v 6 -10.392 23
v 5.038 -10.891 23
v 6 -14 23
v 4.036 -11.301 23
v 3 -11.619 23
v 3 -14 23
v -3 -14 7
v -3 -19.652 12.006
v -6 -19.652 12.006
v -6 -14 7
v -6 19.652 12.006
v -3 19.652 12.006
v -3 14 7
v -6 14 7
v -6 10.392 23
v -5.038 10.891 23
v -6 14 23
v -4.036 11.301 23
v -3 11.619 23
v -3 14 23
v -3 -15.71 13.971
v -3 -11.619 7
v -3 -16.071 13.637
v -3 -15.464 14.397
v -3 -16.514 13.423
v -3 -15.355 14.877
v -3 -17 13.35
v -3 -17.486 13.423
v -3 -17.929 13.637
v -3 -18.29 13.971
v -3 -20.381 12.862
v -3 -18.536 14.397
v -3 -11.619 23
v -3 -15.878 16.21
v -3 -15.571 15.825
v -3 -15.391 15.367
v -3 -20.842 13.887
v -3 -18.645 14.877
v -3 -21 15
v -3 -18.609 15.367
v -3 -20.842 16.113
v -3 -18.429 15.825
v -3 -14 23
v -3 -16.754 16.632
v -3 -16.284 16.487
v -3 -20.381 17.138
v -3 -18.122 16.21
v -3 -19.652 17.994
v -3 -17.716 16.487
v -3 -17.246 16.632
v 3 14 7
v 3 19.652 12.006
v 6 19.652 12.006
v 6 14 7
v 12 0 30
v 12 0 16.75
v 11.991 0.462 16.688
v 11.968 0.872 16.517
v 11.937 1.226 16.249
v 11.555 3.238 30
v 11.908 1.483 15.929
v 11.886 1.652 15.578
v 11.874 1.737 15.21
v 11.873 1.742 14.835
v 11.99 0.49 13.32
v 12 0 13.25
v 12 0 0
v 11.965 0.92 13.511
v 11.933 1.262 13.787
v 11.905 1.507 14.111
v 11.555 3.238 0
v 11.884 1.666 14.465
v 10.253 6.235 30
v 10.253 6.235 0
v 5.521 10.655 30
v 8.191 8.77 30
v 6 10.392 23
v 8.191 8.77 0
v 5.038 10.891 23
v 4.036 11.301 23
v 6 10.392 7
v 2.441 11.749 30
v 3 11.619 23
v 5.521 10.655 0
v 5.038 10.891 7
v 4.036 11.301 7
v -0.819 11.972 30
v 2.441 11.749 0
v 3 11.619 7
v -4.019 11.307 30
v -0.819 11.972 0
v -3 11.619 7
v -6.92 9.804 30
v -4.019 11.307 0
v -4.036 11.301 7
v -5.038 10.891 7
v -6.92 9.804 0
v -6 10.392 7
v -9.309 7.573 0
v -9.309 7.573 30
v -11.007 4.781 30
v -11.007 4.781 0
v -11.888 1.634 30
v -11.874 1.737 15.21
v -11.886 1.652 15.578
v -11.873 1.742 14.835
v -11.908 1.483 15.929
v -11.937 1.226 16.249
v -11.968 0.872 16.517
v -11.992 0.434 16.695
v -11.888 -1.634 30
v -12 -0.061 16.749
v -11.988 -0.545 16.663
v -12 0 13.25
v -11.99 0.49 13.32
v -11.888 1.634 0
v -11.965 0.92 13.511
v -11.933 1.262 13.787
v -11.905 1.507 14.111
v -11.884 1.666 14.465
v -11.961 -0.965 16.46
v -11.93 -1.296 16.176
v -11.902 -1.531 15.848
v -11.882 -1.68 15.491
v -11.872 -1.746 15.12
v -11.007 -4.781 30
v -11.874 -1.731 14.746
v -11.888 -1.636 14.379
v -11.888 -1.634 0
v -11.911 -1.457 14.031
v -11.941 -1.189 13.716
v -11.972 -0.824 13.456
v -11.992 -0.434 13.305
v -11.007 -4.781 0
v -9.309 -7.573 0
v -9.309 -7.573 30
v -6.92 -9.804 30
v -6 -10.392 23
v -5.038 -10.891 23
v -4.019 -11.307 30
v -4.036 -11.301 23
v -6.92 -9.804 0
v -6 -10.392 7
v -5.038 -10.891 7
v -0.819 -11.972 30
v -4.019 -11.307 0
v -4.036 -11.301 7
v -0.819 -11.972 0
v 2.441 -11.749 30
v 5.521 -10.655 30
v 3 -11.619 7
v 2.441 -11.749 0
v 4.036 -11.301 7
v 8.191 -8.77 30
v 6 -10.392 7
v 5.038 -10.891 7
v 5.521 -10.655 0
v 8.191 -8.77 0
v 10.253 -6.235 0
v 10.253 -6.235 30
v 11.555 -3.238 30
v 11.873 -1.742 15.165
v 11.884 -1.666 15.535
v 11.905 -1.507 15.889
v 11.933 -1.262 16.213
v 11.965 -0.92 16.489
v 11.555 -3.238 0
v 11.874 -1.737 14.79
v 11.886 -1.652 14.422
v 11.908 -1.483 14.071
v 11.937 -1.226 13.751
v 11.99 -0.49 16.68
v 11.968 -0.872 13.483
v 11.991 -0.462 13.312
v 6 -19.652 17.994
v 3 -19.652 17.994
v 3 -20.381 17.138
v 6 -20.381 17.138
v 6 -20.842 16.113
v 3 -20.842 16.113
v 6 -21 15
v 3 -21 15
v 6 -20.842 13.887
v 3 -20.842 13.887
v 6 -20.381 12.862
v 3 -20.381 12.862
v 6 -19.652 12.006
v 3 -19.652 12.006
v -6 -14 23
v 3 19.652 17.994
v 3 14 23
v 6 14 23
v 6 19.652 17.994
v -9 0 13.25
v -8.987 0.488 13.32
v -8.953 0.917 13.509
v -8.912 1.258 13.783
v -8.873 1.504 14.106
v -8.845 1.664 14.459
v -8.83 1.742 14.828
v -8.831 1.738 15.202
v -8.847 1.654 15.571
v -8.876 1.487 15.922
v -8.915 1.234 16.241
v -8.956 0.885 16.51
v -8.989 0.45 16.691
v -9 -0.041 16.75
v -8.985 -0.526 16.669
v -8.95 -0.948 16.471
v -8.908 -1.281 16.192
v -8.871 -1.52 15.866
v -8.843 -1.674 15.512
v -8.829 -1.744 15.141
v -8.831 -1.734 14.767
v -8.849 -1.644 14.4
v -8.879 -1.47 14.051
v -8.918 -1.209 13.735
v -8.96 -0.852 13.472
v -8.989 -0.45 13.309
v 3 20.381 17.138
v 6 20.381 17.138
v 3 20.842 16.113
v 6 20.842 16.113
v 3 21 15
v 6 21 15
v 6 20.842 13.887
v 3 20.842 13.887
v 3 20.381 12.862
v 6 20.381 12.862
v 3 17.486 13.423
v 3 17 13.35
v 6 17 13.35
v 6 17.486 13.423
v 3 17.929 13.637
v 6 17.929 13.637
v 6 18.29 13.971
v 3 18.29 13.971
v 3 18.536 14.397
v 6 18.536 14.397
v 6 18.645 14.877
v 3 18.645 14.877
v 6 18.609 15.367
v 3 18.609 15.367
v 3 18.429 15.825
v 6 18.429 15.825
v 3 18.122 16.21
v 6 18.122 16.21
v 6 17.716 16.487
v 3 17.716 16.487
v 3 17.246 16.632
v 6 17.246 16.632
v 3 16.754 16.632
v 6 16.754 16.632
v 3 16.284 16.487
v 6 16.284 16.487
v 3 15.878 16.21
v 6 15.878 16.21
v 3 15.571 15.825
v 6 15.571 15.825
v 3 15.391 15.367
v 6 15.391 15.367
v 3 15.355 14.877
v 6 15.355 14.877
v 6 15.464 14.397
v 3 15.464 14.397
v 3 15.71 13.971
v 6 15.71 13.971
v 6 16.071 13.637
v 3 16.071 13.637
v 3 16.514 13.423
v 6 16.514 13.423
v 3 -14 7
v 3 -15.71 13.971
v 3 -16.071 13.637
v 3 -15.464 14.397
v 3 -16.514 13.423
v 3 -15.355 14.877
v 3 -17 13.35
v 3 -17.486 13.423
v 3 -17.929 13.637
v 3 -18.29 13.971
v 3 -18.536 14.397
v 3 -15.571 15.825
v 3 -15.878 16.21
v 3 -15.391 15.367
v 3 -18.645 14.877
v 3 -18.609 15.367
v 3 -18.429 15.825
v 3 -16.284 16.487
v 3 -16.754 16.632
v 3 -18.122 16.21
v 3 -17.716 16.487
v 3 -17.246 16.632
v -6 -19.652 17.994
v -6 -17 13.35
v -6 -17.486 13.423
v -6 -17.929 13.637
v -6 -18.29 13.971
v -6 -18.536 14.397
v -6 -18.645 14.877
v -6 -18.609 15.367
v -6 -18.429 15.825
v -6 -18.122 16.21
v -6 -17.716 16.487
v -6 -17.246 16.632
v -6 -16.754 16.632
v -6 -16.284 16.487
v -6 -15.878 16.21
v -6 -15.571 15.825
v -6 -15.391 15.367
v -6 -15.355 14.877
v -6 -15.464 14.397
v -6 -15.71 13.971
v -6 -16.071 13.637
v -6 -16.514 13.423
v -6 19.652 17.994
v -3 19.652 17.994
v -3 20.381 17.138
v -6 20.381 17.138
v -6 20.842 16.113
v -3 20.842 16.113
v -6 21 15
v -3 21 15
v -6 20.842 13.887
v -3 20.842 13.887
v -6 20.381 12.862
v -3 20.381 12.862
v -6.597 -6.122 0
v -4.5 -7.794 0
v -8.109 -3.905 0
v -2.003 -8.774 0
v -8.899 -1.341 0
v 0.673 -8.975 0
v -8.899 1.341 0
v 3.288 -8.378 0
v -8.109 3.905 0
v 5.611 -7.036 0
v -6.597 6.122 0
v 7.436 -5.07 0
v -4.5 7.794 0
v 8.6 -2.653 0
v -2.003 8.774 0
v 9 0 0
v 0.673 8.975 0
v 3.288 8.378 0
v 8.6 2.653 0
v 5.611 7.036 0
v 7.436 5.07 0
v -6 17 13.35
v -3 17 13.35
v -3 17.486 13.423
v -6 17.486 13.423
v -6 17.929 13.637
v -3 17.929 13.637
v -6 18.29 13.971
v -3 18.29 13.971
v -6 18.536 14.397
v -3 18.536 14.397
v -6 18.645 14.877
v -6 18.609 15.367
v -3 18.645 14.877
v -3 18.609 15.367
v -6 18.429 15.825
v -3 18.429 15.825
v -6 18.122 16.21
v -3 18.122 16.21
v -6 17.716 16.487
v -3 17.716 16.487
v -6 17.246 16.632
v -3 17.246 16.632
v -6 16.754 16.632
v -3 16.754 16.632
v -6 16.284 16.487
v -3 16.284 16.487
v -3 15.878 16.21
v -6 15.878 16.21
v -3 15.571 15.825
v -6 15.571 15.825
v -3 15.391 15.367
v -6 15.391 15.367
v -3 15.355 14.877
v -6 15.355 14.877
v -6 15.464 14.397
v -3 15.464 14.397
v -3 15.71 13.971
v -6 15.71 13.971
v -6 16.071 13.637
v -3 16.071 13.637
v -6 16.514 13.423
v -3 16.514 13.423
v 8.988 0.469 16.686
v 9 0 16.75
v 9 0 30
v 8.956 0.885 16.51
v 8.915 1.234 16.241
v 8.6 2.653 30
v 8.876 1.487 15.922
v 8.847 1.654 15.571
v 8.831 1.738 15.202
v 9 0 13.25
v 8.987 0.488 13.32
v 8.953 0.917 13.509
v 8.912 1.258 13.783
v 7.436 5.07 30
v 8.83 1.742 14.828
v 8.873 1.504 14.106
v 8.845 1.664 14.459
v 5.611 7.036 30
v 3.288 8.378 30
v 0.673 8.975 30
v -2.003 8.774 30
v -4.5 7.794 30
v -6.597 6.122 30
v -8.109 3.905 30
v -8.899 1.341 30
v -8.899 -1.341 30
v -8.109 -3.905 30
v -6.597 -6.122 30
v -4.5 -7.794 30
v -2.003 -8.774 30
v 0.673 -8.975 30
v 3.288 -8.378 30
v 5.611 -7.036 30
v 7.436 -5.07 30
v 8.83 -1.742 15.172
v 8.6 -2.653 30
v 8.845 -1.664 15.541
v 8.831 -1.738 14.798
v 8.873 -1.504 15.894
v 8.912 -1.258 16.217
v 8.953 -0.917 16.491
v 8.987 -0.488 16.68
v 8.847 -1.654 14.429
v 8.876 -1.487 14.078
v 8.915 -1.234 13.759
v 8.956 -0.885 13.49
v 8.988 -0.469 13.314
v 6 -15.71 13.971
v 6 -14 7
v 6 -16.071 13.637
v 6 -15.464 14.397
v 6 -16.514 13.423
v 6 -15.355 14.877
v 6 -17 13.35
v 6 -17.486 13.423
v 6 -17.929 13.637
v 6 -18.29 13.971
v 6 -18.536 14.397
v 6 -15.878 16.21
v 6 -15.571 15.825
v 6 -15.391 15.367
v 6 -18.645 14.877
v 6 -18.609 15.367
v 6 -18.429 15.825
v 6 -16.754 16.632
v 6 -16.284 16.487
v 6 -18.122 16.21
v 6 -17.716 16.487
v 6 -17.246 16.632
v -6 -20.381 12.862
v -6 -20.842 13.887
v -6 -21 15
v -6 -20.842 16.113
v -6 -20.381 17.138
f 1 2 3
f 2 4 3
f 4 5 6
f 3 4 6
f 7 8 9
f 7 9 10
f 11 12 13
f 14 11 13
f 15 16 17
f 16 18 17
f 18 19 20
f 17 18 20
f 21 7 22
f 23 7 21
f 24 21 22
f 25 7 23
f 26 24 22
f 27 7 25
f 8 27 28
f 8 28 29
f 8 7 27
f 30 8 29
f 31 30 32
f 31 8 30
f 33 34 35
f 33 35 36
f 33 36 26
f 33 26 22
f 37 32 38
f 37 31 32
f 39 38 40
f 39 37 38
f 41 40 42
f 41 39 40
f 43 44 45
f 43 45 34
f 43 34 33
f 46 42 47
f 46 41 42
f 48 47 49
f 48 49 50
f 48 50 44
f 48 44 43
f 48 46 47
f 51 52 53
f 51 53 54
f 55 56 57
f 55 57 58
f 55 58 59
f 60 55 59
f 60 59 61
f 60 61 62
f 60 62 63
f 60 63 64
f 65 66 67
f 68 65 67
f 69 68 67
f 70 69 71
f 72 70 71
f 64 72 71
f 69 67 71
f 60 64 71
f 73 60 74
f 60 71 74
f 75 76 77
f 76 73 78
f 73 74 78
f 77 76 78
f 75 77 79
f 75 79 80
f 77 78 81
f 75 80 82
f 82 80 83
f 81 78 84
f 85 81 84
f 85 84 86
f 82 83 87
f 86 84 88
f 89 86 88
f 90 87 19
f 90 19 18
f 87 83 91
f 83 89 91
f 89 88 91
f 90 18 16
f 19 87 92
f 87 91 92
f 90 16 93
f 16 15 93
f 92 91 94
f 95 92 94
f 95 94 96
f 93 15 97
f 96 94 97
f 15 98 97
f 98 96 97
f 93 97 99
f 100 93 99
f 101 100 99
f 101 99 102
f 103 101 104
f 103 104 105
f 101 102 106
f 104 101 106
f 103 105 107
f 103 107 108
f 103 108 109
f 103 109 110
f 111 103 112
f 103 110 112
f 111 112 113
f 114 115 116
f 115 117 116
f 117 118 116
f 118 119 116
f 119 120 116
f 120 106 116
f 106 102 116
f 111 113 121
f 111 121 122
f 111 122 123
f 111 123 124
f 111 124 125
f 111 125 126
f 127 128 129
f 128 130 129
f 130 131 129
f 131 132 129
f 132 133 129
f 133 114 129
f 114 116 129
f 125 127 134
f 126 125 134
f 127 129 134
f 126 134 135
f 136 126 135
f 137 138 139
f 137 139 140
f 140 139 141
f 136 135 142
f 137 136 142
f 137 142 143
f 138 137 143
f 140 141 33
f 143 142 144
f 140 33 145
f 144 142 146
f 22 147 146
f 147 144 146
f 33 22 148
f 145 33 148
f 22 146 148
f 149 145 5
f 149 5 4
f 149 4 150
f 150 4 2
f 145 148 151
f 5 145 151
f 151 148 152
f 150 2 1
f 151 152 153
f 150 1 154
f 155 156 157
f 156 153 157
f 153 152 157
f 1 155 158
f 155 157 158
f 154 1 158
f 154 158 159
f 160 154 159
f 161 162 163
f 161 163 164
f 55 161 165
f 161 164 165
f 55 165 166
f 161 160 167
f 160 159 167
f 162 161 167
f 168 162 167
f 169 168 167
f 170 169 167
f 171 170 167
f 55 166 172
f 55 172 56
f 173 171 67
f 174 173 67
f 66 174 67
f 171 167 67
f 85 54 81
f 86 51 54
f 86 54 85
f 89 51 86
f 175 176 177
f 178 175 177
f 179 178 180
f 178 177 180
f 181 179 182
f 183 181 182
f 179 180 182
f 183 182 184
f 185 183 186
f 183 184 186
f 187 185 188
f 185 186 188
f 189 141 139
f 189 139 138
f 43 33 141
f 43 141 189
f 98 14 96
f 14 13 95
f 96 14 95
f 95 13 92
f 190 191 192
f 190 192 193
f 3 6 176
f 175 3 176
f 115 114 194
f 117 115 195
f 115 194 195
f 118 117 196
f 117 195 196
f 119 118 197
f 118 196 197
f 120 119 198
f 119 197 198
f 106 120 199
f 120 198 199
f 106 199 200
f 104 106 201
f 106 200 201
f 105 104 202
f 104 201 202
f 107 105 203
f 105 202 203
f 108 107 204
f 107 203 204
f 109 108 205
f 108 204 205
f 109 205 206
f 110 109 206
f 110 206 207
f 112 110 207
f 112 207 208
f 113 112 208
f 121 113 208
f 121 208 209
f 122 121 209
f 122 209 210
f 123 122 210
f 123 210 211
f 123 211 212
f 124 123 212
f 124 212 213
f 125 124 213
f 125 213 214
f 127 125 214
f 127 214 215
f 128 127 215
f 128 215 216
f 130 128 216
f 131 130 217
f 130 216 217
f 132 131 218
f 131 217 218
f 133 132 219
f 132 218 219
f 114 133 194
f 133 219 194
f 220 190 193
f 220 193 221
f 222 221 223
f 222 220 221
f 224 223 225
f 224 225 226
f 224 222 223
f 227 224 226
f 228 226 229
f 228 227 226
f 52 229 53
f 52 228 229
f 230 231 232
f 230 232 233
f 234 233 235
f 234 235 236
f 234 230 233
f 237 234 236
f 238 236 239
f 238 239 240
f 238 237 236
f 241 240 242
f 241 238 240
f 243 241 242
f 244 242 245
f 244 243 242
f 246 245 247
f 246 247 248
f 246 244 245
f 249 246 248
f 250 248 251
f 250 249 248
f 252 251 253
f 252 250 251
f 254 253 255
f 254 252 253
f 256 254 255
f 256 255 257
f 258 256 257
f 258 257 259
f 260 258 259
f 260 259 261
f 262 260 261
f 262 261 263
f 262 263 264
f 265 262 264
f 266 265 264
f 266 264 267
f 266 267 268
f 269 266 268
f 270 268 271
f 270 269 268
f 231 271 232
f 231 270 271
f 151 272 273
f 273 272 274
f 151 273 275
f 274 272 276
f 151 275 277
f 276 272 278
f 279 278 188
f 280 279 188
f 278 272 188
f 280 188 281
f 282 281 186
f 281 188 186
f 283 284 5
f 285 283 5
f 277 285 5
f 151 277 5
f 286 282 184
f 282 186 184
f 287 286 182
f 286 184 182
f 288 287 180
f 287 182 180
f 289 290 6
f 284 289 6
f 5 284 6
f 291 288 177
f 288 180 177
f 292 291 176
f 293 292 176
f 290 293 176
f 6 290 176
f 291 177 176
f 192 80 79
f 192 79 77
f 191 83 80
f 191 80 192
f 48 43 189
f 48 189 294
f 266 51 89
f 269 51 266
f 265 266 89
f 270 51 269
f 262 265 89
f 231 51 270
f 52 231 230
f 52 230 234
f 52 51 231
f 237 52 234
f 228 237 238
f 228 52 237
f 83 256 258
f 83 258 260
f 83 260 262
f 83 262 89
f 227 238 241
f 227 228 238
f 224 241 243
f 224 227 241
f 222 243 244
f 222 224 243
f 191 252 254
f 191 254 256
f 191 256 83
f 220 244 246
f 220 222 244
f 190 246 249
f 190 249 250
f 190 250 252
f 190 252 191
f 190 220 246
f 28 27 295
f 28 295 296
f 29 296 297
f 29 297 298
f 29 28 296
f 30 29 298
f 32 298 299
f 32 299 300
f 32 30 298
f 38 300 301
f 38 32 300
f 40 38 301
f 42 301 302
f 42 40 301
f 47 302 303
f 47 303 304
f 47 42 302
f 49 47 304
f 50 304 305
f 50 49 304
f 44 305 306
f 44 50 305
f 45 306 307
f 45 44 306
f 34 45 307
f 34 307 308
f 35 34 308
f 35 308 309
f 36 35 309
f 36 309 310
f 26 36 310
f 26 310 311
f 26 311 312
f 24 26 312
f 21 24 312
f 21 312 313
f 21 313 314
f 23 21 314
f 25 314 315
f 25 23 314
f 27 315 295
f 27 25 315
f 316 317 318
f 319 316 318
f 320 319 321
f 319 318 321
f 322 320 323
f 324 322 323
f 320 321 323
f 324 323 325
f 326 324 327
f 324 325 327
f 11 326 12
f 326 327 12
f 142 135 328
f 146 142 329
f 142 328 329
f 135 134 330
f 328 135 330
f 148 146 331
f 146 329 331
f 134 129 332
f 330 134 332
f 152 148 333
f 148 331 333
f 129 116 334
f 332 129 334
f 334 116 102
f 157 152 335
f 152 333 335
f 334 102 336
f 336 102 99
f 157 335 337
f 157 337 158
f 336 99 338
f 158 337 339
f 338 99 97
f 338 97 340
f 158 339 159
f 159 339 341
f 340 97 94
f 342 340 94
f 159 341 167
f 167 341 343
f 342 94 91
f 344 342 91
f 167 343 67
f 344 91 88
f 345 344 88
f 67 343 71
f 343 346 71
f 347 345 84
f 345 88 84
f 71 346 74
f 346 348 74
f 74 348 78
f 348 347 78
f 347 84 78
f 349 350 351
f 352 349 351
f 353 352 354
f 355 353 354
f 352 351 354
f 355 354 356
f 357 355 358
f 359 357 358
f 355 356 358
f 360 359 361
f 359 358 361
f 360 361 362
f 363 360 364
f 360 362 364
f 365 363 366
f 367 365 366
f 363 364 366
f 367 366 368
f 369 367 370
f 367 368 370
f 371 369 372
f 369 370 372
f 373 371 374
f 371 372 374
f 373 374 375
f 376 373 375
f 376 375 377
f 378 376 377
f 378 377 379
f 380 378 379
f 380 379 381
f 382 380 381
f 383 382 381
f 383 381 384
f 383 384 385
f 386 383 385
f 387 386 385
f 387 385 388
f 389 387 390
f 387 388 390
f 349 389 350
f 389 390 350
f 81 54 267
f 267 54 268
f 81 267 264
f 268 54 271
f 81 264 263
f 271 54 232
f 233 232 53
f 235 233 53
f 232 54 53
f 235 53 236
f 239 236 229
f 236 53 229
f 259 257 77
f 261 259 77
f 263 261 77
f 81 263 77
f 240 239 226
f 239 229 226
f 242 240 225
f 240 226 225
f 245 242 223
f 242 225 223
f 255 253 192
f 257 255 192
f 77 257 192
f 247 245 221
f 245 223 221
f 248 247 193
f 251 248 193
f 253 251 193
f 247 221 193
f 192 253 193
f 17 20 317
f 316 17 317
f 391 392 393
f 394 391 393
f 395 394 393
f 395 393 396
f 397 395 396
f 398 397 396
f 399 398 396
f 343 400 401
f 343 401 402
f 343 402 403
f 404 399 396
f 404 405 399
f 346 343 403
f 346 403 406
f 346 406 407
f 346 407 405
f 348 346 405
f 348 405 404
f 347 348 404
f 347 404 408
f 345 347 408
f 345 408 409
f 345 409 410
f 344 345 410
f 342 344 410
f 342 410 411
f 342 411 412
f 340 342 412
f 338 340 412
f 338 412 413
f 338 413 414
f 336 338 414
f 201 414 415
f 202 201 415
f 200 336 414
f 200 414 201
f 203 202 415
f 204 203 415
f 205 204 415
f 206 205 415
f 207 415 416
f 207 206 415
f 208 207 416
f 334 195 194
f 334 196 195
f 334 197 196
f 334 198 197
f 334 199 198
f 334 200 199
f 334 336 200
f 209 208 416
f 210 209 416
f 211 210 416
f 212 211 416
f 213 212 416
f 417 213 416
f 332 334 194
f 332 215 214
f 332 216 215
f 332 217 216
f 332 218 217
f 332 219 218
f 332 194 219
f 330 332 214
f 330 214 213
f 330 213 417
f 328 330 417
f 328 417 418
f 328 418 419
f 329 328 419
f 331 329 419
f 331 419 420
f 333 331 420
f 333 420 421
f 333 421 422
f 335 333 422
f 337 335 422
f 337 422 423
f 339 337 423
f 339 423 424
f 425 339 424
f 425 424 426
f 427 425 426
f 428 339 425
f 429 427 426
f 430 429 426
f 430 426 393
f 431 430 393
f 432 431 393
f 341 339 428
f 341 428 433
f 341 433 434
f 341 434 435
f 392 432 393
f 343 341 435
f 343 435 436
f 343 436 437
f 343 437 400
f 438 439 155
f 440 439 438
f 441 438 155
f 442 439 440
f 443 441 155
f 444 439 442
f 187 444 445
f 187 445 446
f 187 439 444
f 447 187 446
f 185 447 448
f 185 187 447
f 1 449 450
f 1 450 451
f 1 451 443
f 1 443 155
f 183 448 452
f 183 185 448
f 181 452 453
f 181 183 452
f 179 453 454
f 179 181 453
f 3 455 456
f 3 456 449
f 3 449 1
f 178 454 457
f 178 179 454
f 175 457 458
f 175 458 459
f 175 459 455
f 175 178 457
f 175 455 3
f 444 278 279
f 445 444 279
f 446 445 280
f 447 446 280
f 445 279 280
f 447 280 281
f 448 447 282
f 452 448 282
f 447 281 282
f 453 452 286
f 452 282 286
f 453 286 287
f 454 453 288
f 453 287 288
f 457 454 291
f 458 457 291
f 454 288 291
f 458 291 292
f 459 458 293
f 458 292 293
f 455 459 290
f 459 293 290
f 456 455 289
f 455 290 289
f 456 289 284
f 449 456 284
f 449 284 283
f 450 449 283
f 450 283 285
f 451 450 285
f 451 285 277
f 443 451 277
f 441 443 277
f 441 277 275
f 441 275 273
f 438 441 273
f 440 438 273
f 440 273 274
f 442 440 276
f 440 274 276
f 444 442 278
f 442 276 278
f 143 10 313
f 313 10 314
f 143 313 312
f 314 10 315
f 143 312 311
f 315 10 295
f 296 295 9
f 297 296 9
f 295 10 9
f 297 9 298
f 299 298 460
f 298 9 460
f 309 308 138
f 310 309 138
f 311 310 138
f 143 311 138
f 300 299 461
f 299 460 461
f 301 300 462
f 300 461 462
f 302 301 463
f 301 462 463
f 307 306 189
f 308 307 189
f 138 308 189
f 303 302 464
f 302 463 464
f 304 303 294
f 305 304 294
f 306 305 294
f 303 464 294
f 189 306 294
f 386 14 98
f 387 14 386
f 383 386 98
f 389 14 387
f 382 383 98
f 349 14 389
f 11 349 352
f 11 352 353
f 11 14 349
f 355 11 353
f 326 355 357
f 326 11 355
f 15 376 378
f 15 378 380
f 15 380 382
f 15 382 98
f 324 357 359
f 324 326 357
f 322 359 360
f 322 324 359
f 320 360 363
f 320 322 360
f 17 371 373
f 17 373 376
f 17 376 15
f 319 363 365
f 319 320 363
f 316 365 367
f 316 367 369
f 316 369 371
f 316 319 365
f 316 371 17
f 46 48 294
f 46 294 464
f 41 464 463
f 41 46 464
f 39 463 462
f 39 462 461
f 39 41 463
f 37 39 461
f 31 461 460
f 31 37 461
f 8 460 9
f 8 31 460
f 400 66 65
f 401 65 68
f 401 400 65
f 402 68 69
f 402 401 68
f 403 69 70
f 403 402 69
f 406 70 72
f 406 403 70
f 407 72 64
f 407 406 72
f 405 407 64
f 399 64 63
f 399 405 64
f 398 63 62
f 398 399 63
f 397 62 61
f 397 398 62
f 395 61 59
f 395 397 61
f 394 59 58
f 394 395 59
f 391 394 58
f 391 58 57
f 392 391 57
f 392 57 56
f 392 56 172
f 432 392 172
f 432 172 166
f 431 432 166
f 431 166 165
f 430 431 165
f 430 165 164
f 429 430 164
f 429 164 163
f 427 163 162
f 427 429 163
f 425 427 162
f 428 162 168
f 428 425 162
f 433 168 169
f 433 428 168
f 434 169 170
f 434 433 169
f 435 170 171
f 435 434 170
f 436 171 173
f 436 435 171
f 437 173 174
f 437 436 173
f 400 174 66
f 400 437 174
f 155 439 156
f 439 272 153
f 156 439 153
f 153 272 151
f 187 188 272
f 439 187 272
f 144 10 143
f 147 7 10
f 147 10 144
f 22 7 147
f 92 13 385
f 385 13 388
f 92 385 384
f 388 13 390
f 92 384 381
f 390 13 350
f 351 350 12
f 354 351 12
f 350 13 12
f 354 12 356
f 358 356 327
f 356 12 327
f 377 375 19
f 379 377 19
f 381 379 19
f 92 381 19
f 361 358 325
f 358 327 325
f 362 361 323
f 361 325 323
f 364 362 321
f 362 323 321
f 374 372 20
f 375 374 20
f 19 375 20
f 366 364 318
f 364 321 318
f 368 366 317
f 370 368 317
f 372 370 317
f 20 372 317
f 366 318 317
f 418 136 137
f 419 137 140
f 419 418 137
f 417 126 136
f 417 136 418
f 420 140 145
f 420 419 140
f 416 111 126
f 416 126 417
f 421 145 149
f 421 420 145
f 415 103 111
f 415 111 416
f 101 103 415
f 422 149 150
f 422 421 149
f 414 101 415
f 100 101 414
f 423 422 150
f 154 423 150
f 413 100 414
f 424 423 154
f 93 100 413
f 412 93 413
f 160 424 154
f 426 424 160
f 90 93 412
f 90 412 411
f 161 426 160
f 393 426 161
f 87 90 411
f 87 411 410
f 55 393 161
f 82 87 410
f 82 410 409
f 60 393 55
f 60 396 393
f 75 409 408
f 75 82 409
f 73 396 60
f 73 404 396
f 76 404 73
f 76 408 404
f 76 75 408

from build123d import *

# Parameters (mm, degrees)
SKETCH_1_R               = 12
SKETCH_1_R_2             = 9
EXTRUDE_1_DEPTH          = 30
SKETCH_2_R               = 1.65
EXTRUDE_2_DEPTH          = 3
SKETCH_3_R               = 1.75
CUT_EXTRUDE_1_DEPTH      = 13
CUT_EXTRUDE_1_DEPTH_BACK = 13
MIRROR_2_COPY_1_SKETCH_R = 1.65
MIRROR_2_COPY_1_DEPTH    = 3


with BuildPart() as part:
    # ｽｹｯﾁ1 → ﾎﾞｽ - 押し出し1 (new body)
    with BuildSketch(Plane.XY):
        Circle(SKETCH_1_R)
        Circle(SKETCH_1_R_2, mode=Mode.SUBTRACT)
    extrude(amount=EXTRUDE_1_DEPTH)

    # ｽｹｯﾁ2 → ﾎﾞｽ - 押し出し2 (add)
    with BuildSketch(Plane(origin=(3, 0, 0), x_dir=(0, 0, -1), z_dir=(1, 0, 0))):
        with BuildLine():
            Line((-23, 9), (-23, 14))
            Line((-23, 14), (-17.994493332, 19.651982218))
            ThreePointArc((-17.994493332, 19.651982218), (-15, 21), (-12.005506668, 19.651982218))
            Line((-12.005506668, 19.651982218), (-7, 14))
            Line((-7, 14), (-7, 9))
            Line((-7, 9), (-23, 9))
        make_face()
        with Locations((-15, 17)):
            Circle(SKETCH_2_R, mode=Mode.SUBTRACT)
    extrude_2 = extrude(amount=EXTRUDE_2_DEPTH)

    # ﾐﾗｰ1: ﾎﾞｽ - 押し出し2 across plane
    add(extrude_2.mirror(Plane(origin=(0, 0, 0), x_dir=(0, 0, 1), z_dir=(1, 0, 0))))

    # ｽｹｯﾁ3 → ｶｯﾄ - 押し出し1 (cut, two sides)
    with BuildSketch(Plane(origin=(0, 0, 0), x_dir=(0, 0, -1), z_dir=(1, 0, 0))) as cut_extrude_1_sk:
        with Locations((-15, 0)):
            Circle(SKETCH_3_R)
    extrude(amount=CUT_EXTRUDE_1_DEPTH, mode=Mode.SUBTRACT)
    extrude(cut_extrude_1_sk.sketch, amount=-CUT_EXTRUDE_1_DEPTH_BACK, mode=Mode.SUBTRACT)

    # ﾐﾗｰ2: ﾎﾞｽ - 押し出し2 across plane
    add(extrude_2.mirror(Plane.ZX))

    # ﾐﾗｰ2 copy 1 sketch → ﾐﾗｰ2 copy 1 (add)
    with BuildSketch(Plane(origin=(-3, 0, 0), x_dir=(0, 0, -1), z_dir=(-1, 0, 0))):
        with BuildLine():
            Line((-23, 9), (-23, 14))
            Line((-23, 14), (-17.994493332, 19.651982218))
            ThreePointArc((-17.994493332, 19.651982218), (-15, 21), (-12.005506668, 19.651982218))
            Line((-12.005506668, 19.651982218), (-7, 14))
            Line((-7, 14), (-7, 9))
            Line((-7, 9), (-23, 9))
        make_face()
        with Locations((-15, 17)):
            Circle(MIRROR_2_COPY_1_SKETCH_R, mode=Mode.SUBTRACT)
    extrude(amount=MIRROR_2_COPY_1_DEPTH)


solid = part.part
